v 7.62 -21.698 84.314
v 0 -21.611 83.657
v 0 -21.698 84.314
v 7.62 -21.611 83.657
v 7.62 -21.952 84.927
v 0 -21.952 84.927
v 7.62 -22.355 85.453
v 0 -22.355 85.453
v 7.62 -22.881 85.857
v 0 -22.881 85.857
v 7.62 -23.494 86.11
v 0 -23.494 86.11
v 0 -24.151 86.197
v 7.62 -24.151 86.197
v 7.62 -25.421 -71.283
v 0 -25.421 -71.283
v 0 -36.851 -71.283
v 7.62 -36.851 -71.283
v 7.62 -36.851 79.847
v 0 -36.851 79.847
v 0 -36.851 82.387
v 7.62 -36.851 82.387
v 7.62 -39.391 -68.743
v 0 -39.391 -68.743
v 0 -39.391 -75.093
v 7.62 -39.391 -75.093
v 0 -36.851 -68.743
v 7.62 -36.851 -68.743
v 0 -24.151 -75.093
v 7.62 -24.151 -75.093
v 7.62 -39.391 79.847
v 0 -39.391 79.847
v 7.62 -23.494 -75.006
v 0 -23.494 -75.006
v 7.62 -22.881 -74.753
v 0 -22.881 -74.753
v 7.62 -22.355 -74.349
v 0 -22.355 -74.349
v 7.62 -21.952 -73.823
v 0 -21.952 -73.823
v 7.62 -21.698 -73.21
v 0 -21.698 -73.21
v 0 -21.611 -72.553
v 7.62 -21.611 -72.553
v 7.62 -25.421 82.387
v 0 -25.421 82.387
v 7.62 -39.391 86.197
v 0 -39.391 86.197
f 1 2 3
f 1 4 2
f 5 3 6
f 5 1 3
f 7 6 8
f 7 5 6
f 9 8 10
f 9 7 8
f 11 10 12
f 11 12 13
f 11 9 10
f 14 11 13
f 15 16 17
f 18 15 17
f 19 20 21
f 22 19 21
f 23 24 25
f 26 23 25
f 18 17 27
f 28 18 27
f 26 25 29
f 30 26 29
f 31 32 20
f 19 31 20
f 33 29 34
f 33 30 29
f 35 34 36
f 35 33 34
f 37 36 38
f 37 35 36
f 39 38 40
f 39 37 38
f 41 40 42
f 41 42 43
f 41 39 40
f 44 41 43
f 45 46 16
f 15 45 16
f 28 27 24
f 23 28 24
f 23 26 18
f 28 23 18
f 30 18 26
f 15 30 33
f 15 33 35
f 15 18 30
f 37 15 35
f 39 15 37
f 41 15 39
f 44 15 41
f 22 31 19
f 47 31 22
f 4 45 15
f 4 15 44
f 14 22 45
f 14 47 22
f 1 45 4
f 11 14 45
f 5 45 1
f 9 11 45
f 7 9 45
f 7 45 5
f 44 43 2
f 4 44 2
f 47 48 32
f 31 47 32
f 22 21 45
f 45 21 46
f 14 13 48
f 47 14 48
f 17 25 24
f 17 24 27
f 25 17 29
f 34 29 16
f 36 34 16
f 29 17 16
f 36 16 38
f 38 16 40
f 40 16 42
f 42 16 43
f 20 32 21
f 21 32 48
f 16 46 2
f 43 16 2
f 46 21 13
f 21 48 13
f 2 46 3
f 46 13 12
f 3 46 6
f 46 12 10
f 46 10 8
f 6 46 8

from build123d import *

# Parameters (mm, degrees)
F1_DEPTH = 7.62
F2_R     = 2.54


# Not quite as in the source:
# - a feature names something its author has since deleted; it is built from what else it names


with BuildPart() as f1:
    # F0 (on Right) → F1 (new body)
    with BuildSketch(Plane.YZ):
        Polygon((-39.391245693, -75.0930126251), (-21.611245693, -75.0930126251), (-21.611245693, 86.1969873749), (-36.851245693, 86.1969873749), (-39.391245693, 86.1969873749), (-39.391245693, 79.8469873749), (-36.851245693, 79.8469873749), (-36.851245693, 82.3869873749), (-25.421245693, 82.3869873749), (-25.421245693, -71.2830126251), (-36.851245693, -71.2830126251), (-36.851245693, -68.7430126251), (-39.391245693, -68.7430126251), align=None)
    extrude(amount=F1_DEPTH)

    # F2
    f2_edges = [f1.edges().sort_by_distance(p)[0] for p in [
        (3.81, -21.611246, -75.093013),
        (3.81, -21.611246, 86.196987),
    ]]
    fillet(f2_edges, radius=F2_R)


solid = f1.part
